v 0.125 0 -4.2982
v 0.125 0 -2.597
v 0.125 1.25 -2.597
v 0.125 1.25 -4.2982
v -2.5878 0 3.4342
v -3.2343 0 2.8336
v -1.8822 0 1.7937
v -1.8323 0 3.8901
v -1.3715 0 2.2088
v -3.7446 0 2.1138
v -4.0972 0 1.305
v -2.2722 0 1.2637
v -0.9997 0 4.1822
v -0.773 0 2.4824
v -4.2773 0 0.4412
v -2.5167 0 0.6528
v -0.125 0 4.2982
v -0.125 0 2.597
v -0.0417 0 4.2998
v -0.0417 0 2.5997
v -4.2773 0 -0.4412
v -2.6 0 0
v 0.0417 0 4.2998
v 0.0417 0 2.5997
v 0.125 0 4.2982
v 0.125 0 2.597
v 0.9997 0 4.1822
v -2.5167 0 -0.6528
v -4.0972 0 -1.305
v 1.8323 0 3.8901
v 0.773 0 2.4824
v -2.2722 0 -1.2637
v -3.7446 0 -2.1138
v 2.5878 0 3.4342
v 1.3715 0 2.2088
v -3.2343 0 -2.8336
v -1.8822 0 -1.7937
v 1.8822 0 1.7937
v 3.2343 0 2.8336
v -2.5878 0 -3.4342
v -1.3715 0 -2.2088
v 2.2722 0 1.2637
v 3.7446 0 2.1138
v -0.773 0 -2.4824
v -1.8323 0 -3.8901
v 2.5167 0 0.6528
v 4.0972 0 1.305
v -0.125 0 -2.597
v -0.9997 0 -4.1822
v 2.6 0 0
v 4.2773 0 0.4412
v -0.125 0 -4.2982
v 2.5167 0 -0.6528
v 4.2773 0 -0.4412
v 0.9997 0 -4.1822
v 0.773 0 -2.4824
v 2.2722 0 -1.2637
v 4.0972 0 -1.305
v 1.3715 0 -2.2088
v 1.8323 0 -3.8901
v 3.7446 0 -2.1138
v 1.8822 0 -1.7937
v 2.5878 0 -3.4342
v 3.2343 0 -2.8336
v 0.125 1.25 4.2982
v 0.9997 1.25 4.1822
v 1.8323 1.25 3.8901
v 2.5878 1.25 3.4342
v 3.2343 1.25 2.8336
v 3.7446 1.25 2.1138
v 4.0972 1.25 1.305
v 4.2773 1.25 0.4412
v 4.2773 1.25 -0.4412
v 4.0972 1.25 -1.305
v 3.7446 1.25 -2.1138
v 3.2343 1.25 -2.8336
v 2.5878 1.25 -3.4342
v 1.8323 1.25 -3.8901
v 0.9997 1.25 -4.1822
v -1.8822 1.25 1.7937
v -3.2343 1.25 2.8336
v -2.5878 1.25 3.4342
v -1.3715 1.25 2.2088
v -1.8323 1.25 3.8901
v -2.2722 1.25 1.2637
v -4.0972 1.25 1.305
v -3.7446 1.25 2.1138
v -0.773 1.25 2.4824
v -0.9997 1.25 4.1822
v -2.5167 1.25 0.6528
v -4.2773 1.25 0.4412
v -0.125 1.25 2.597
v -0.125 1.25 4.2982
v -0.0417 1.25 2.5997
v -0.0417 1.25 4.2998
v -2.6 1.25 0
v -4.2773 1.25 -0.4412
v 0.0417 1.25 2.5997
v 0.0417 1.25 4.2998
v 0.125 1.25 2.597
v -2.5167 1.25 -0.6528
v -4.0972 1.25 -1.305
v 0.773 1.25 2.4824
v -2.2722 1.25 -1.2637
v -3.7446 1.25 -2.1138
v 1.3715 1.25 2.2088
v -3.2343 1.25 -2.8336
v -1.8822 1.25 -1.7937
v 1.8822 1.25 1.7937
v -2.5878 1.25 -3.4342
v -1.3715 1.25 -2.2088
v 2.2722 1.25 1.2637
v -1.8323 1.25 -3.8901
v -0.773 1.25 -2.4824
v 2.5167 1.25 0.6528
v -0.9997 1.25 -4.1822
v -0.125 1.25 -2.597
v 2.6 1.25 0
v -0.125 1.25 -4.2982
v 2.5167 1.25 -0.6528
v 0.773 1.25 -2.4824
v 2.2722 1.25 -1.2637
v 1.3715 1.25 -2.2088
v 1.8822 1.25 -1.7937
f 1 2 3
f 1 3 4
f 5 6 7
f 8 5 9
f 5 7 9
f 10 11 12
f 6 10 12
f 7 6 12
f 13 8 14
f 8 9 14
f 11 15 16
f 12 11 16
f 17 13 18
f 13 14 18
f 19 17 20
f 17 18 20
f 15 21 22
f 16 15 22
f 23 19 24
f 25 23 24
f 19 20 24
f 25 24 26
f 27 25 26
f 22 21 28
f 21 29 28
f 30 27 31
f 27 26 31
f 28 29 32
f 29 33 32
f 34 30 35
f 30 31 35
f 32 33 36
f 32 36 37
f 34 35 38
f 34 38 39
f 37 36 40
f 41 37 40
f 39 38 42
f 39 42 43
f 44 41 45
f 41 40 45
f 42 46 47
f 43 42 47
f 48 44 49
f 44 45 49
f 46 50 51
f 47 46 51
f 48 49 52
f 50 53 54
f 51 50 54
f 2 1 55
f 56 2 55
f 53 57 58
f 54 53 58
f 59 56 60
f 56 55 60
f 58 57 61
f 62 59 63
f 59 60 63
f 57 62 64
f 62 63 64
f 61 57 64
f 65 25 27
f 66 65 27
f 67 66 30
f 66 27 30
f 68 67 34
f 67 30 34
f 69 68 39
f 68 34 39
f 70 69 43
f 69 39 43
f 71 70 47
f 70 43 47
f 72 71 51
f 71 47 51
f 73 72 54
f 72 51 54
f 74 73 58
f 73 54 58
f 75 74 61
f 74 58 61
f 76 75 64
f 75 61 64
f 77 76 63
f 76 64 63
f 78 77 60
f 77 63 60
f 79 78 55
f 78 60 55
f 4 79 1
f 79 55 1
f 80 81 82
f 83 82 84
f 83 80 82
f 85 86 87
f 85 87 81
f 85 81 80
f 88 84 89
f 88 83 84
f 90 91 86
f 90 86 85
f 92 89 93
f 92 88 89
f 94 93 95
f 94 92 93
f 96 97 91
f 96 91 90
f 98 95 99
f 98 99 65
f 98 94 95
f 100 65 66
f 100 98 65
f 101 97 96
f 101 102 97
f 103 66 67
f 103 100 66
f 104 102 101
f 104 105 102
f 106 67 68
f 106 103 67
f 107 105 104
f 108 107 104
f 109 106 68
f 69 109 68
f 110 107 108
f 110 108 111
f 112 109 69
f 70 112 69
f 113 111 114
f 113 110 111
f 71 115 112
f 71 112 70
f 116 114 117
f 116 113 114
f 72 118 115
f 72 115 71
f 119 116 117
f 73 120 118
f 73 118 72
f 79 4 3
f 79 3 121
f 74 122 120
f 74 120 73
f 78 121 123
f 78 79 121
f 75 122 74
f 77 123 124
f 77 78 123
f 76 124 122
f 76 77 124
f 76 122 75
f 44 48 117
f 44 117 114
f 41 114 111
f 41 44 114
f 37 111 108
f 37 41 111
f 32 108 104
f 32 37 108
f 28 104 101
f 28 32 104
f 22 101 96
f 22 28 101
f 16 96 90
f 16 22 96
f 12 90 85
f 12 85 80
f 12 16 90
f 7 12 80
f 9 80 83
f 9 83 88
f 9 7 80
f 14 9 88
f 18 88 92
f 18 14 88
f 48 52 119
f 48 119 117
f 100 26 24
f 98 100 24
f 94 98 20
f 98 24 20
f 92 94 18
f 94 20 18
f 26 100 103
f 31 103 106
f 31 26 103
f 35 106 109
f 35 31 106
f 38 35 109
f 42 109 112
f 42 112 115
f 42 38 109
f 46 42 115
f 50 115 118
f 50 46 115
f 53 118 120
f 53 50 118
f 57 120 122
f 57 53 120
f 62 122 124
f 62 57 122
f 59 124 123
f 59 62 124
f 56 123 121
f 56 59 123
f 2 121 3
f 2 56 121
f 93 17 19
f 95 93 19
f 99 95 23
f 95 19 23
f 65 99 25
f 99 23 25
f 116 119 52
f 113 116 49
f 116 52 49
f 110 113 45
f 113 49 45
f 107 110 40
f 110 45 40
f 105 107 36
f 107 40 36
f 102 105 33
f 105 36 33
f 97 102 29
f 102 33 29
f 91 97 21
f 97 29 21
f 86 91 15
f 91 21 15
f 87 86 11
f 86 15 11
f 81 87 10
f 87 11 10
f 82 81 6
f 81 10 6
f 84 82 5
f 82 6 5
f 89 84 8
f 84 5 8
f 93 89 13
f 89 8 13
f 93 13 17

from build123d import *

# Parameters (mm, degrees)
SKETCH1_R               = 4.3
SKETCH1_R_2             = 2.6
BOSS_EXTRUDE1_DEPTH     = 1.25
SKETCH2_W               = 0.25
SKETCH2_H               = 4.3
CUT_EXTRUDE1_DEPTH      = 7.208260626
BODY_MOVE_COPY1_DEPTH   = 1.25
BODY_MOVE_COPY1_2_DEPTH = 1.25


# Read off the part's stored shape, not the designer's step: Body-Move/Copy1
with BuildPart() as part:
    # Sketch1 → Boss-Extrude1 (new body)
    with BuildSketch(Plane(origin=(0, 0, 0), x_dir=(1, 0, 0), z_dir=(0, 1, 0))):
        with Locations(Location((0, 0, 0), (0, 0, 270))):
            Circle(SKETCH1_R)
        with Locations(Location((0, 0, 0), (0, 0, 270))):
            Circle(SKETCH1_R_2, mode=Mode.SUBTRACT)
    extrude(amount=BOSS_EXTRUDE1_DEPTH)

    # Sketch2 → Cut-Extrude1 (cut, through all)
    with BuildSketch(Plane.XZ):
        with Locations((0, 2.15)):
            Rectangle(SKETCH2_W, SKETCH2_H)
    extrude(amount=-CUT_EXTRUDE1_DEPTH, mode=Mode.SUBTRACT)

    # Body-Move/Copy1 outline → Body-Move/Copy1 (cut)
    with BuildSketch(Plane(origin=(0, 0, 0), x_dir=(1, 0, 0), z_dir=(0, 1, 0))):
        with BuildLine():
            Line((0.125, 2.596993454), (0.125, 4.298182756))
            ThreePointArc((0.125, 4.298182756), (0, 4.3), (-0.125, 4.298182756))
            Line((-0.125, 4.298182756), (-0.125, 2.596993454))
            ThreePointArc((-0.125, 2.596993454), (0, 2.6), (0.125, 2.596993454))
        make_face()
    extrude(amount=BODY_MOVE_COPY1_DEPTH, mode=Mode.SUBTRACT)

    # Body-Move_Copy1 2 outline → Body-Move_Copy1 2 (add)
    with BuildSketch(Plane(origin=(0, 0, 0), x_dir=(1, 0, 0), z_dir=(0, 1, 0))):
        with BuildLine():
            ThreePointArc((-0.125, -4.298182756), (0, -4.3), (0.125, -4.298182756))
            Line((0.125, -4.298182756), (0.125, -2.596993454))
            ThreePointArc((0.125, -2.596993454), (0, -2.6), (-0.125, -2.596993454))
            Line((-0.125, -2.596993454), (-0.125, -4.298182756))
        make_face()
    extrude(amount=BODY_MOVE_COPY1_2_DEPTH)


solid = part.part
